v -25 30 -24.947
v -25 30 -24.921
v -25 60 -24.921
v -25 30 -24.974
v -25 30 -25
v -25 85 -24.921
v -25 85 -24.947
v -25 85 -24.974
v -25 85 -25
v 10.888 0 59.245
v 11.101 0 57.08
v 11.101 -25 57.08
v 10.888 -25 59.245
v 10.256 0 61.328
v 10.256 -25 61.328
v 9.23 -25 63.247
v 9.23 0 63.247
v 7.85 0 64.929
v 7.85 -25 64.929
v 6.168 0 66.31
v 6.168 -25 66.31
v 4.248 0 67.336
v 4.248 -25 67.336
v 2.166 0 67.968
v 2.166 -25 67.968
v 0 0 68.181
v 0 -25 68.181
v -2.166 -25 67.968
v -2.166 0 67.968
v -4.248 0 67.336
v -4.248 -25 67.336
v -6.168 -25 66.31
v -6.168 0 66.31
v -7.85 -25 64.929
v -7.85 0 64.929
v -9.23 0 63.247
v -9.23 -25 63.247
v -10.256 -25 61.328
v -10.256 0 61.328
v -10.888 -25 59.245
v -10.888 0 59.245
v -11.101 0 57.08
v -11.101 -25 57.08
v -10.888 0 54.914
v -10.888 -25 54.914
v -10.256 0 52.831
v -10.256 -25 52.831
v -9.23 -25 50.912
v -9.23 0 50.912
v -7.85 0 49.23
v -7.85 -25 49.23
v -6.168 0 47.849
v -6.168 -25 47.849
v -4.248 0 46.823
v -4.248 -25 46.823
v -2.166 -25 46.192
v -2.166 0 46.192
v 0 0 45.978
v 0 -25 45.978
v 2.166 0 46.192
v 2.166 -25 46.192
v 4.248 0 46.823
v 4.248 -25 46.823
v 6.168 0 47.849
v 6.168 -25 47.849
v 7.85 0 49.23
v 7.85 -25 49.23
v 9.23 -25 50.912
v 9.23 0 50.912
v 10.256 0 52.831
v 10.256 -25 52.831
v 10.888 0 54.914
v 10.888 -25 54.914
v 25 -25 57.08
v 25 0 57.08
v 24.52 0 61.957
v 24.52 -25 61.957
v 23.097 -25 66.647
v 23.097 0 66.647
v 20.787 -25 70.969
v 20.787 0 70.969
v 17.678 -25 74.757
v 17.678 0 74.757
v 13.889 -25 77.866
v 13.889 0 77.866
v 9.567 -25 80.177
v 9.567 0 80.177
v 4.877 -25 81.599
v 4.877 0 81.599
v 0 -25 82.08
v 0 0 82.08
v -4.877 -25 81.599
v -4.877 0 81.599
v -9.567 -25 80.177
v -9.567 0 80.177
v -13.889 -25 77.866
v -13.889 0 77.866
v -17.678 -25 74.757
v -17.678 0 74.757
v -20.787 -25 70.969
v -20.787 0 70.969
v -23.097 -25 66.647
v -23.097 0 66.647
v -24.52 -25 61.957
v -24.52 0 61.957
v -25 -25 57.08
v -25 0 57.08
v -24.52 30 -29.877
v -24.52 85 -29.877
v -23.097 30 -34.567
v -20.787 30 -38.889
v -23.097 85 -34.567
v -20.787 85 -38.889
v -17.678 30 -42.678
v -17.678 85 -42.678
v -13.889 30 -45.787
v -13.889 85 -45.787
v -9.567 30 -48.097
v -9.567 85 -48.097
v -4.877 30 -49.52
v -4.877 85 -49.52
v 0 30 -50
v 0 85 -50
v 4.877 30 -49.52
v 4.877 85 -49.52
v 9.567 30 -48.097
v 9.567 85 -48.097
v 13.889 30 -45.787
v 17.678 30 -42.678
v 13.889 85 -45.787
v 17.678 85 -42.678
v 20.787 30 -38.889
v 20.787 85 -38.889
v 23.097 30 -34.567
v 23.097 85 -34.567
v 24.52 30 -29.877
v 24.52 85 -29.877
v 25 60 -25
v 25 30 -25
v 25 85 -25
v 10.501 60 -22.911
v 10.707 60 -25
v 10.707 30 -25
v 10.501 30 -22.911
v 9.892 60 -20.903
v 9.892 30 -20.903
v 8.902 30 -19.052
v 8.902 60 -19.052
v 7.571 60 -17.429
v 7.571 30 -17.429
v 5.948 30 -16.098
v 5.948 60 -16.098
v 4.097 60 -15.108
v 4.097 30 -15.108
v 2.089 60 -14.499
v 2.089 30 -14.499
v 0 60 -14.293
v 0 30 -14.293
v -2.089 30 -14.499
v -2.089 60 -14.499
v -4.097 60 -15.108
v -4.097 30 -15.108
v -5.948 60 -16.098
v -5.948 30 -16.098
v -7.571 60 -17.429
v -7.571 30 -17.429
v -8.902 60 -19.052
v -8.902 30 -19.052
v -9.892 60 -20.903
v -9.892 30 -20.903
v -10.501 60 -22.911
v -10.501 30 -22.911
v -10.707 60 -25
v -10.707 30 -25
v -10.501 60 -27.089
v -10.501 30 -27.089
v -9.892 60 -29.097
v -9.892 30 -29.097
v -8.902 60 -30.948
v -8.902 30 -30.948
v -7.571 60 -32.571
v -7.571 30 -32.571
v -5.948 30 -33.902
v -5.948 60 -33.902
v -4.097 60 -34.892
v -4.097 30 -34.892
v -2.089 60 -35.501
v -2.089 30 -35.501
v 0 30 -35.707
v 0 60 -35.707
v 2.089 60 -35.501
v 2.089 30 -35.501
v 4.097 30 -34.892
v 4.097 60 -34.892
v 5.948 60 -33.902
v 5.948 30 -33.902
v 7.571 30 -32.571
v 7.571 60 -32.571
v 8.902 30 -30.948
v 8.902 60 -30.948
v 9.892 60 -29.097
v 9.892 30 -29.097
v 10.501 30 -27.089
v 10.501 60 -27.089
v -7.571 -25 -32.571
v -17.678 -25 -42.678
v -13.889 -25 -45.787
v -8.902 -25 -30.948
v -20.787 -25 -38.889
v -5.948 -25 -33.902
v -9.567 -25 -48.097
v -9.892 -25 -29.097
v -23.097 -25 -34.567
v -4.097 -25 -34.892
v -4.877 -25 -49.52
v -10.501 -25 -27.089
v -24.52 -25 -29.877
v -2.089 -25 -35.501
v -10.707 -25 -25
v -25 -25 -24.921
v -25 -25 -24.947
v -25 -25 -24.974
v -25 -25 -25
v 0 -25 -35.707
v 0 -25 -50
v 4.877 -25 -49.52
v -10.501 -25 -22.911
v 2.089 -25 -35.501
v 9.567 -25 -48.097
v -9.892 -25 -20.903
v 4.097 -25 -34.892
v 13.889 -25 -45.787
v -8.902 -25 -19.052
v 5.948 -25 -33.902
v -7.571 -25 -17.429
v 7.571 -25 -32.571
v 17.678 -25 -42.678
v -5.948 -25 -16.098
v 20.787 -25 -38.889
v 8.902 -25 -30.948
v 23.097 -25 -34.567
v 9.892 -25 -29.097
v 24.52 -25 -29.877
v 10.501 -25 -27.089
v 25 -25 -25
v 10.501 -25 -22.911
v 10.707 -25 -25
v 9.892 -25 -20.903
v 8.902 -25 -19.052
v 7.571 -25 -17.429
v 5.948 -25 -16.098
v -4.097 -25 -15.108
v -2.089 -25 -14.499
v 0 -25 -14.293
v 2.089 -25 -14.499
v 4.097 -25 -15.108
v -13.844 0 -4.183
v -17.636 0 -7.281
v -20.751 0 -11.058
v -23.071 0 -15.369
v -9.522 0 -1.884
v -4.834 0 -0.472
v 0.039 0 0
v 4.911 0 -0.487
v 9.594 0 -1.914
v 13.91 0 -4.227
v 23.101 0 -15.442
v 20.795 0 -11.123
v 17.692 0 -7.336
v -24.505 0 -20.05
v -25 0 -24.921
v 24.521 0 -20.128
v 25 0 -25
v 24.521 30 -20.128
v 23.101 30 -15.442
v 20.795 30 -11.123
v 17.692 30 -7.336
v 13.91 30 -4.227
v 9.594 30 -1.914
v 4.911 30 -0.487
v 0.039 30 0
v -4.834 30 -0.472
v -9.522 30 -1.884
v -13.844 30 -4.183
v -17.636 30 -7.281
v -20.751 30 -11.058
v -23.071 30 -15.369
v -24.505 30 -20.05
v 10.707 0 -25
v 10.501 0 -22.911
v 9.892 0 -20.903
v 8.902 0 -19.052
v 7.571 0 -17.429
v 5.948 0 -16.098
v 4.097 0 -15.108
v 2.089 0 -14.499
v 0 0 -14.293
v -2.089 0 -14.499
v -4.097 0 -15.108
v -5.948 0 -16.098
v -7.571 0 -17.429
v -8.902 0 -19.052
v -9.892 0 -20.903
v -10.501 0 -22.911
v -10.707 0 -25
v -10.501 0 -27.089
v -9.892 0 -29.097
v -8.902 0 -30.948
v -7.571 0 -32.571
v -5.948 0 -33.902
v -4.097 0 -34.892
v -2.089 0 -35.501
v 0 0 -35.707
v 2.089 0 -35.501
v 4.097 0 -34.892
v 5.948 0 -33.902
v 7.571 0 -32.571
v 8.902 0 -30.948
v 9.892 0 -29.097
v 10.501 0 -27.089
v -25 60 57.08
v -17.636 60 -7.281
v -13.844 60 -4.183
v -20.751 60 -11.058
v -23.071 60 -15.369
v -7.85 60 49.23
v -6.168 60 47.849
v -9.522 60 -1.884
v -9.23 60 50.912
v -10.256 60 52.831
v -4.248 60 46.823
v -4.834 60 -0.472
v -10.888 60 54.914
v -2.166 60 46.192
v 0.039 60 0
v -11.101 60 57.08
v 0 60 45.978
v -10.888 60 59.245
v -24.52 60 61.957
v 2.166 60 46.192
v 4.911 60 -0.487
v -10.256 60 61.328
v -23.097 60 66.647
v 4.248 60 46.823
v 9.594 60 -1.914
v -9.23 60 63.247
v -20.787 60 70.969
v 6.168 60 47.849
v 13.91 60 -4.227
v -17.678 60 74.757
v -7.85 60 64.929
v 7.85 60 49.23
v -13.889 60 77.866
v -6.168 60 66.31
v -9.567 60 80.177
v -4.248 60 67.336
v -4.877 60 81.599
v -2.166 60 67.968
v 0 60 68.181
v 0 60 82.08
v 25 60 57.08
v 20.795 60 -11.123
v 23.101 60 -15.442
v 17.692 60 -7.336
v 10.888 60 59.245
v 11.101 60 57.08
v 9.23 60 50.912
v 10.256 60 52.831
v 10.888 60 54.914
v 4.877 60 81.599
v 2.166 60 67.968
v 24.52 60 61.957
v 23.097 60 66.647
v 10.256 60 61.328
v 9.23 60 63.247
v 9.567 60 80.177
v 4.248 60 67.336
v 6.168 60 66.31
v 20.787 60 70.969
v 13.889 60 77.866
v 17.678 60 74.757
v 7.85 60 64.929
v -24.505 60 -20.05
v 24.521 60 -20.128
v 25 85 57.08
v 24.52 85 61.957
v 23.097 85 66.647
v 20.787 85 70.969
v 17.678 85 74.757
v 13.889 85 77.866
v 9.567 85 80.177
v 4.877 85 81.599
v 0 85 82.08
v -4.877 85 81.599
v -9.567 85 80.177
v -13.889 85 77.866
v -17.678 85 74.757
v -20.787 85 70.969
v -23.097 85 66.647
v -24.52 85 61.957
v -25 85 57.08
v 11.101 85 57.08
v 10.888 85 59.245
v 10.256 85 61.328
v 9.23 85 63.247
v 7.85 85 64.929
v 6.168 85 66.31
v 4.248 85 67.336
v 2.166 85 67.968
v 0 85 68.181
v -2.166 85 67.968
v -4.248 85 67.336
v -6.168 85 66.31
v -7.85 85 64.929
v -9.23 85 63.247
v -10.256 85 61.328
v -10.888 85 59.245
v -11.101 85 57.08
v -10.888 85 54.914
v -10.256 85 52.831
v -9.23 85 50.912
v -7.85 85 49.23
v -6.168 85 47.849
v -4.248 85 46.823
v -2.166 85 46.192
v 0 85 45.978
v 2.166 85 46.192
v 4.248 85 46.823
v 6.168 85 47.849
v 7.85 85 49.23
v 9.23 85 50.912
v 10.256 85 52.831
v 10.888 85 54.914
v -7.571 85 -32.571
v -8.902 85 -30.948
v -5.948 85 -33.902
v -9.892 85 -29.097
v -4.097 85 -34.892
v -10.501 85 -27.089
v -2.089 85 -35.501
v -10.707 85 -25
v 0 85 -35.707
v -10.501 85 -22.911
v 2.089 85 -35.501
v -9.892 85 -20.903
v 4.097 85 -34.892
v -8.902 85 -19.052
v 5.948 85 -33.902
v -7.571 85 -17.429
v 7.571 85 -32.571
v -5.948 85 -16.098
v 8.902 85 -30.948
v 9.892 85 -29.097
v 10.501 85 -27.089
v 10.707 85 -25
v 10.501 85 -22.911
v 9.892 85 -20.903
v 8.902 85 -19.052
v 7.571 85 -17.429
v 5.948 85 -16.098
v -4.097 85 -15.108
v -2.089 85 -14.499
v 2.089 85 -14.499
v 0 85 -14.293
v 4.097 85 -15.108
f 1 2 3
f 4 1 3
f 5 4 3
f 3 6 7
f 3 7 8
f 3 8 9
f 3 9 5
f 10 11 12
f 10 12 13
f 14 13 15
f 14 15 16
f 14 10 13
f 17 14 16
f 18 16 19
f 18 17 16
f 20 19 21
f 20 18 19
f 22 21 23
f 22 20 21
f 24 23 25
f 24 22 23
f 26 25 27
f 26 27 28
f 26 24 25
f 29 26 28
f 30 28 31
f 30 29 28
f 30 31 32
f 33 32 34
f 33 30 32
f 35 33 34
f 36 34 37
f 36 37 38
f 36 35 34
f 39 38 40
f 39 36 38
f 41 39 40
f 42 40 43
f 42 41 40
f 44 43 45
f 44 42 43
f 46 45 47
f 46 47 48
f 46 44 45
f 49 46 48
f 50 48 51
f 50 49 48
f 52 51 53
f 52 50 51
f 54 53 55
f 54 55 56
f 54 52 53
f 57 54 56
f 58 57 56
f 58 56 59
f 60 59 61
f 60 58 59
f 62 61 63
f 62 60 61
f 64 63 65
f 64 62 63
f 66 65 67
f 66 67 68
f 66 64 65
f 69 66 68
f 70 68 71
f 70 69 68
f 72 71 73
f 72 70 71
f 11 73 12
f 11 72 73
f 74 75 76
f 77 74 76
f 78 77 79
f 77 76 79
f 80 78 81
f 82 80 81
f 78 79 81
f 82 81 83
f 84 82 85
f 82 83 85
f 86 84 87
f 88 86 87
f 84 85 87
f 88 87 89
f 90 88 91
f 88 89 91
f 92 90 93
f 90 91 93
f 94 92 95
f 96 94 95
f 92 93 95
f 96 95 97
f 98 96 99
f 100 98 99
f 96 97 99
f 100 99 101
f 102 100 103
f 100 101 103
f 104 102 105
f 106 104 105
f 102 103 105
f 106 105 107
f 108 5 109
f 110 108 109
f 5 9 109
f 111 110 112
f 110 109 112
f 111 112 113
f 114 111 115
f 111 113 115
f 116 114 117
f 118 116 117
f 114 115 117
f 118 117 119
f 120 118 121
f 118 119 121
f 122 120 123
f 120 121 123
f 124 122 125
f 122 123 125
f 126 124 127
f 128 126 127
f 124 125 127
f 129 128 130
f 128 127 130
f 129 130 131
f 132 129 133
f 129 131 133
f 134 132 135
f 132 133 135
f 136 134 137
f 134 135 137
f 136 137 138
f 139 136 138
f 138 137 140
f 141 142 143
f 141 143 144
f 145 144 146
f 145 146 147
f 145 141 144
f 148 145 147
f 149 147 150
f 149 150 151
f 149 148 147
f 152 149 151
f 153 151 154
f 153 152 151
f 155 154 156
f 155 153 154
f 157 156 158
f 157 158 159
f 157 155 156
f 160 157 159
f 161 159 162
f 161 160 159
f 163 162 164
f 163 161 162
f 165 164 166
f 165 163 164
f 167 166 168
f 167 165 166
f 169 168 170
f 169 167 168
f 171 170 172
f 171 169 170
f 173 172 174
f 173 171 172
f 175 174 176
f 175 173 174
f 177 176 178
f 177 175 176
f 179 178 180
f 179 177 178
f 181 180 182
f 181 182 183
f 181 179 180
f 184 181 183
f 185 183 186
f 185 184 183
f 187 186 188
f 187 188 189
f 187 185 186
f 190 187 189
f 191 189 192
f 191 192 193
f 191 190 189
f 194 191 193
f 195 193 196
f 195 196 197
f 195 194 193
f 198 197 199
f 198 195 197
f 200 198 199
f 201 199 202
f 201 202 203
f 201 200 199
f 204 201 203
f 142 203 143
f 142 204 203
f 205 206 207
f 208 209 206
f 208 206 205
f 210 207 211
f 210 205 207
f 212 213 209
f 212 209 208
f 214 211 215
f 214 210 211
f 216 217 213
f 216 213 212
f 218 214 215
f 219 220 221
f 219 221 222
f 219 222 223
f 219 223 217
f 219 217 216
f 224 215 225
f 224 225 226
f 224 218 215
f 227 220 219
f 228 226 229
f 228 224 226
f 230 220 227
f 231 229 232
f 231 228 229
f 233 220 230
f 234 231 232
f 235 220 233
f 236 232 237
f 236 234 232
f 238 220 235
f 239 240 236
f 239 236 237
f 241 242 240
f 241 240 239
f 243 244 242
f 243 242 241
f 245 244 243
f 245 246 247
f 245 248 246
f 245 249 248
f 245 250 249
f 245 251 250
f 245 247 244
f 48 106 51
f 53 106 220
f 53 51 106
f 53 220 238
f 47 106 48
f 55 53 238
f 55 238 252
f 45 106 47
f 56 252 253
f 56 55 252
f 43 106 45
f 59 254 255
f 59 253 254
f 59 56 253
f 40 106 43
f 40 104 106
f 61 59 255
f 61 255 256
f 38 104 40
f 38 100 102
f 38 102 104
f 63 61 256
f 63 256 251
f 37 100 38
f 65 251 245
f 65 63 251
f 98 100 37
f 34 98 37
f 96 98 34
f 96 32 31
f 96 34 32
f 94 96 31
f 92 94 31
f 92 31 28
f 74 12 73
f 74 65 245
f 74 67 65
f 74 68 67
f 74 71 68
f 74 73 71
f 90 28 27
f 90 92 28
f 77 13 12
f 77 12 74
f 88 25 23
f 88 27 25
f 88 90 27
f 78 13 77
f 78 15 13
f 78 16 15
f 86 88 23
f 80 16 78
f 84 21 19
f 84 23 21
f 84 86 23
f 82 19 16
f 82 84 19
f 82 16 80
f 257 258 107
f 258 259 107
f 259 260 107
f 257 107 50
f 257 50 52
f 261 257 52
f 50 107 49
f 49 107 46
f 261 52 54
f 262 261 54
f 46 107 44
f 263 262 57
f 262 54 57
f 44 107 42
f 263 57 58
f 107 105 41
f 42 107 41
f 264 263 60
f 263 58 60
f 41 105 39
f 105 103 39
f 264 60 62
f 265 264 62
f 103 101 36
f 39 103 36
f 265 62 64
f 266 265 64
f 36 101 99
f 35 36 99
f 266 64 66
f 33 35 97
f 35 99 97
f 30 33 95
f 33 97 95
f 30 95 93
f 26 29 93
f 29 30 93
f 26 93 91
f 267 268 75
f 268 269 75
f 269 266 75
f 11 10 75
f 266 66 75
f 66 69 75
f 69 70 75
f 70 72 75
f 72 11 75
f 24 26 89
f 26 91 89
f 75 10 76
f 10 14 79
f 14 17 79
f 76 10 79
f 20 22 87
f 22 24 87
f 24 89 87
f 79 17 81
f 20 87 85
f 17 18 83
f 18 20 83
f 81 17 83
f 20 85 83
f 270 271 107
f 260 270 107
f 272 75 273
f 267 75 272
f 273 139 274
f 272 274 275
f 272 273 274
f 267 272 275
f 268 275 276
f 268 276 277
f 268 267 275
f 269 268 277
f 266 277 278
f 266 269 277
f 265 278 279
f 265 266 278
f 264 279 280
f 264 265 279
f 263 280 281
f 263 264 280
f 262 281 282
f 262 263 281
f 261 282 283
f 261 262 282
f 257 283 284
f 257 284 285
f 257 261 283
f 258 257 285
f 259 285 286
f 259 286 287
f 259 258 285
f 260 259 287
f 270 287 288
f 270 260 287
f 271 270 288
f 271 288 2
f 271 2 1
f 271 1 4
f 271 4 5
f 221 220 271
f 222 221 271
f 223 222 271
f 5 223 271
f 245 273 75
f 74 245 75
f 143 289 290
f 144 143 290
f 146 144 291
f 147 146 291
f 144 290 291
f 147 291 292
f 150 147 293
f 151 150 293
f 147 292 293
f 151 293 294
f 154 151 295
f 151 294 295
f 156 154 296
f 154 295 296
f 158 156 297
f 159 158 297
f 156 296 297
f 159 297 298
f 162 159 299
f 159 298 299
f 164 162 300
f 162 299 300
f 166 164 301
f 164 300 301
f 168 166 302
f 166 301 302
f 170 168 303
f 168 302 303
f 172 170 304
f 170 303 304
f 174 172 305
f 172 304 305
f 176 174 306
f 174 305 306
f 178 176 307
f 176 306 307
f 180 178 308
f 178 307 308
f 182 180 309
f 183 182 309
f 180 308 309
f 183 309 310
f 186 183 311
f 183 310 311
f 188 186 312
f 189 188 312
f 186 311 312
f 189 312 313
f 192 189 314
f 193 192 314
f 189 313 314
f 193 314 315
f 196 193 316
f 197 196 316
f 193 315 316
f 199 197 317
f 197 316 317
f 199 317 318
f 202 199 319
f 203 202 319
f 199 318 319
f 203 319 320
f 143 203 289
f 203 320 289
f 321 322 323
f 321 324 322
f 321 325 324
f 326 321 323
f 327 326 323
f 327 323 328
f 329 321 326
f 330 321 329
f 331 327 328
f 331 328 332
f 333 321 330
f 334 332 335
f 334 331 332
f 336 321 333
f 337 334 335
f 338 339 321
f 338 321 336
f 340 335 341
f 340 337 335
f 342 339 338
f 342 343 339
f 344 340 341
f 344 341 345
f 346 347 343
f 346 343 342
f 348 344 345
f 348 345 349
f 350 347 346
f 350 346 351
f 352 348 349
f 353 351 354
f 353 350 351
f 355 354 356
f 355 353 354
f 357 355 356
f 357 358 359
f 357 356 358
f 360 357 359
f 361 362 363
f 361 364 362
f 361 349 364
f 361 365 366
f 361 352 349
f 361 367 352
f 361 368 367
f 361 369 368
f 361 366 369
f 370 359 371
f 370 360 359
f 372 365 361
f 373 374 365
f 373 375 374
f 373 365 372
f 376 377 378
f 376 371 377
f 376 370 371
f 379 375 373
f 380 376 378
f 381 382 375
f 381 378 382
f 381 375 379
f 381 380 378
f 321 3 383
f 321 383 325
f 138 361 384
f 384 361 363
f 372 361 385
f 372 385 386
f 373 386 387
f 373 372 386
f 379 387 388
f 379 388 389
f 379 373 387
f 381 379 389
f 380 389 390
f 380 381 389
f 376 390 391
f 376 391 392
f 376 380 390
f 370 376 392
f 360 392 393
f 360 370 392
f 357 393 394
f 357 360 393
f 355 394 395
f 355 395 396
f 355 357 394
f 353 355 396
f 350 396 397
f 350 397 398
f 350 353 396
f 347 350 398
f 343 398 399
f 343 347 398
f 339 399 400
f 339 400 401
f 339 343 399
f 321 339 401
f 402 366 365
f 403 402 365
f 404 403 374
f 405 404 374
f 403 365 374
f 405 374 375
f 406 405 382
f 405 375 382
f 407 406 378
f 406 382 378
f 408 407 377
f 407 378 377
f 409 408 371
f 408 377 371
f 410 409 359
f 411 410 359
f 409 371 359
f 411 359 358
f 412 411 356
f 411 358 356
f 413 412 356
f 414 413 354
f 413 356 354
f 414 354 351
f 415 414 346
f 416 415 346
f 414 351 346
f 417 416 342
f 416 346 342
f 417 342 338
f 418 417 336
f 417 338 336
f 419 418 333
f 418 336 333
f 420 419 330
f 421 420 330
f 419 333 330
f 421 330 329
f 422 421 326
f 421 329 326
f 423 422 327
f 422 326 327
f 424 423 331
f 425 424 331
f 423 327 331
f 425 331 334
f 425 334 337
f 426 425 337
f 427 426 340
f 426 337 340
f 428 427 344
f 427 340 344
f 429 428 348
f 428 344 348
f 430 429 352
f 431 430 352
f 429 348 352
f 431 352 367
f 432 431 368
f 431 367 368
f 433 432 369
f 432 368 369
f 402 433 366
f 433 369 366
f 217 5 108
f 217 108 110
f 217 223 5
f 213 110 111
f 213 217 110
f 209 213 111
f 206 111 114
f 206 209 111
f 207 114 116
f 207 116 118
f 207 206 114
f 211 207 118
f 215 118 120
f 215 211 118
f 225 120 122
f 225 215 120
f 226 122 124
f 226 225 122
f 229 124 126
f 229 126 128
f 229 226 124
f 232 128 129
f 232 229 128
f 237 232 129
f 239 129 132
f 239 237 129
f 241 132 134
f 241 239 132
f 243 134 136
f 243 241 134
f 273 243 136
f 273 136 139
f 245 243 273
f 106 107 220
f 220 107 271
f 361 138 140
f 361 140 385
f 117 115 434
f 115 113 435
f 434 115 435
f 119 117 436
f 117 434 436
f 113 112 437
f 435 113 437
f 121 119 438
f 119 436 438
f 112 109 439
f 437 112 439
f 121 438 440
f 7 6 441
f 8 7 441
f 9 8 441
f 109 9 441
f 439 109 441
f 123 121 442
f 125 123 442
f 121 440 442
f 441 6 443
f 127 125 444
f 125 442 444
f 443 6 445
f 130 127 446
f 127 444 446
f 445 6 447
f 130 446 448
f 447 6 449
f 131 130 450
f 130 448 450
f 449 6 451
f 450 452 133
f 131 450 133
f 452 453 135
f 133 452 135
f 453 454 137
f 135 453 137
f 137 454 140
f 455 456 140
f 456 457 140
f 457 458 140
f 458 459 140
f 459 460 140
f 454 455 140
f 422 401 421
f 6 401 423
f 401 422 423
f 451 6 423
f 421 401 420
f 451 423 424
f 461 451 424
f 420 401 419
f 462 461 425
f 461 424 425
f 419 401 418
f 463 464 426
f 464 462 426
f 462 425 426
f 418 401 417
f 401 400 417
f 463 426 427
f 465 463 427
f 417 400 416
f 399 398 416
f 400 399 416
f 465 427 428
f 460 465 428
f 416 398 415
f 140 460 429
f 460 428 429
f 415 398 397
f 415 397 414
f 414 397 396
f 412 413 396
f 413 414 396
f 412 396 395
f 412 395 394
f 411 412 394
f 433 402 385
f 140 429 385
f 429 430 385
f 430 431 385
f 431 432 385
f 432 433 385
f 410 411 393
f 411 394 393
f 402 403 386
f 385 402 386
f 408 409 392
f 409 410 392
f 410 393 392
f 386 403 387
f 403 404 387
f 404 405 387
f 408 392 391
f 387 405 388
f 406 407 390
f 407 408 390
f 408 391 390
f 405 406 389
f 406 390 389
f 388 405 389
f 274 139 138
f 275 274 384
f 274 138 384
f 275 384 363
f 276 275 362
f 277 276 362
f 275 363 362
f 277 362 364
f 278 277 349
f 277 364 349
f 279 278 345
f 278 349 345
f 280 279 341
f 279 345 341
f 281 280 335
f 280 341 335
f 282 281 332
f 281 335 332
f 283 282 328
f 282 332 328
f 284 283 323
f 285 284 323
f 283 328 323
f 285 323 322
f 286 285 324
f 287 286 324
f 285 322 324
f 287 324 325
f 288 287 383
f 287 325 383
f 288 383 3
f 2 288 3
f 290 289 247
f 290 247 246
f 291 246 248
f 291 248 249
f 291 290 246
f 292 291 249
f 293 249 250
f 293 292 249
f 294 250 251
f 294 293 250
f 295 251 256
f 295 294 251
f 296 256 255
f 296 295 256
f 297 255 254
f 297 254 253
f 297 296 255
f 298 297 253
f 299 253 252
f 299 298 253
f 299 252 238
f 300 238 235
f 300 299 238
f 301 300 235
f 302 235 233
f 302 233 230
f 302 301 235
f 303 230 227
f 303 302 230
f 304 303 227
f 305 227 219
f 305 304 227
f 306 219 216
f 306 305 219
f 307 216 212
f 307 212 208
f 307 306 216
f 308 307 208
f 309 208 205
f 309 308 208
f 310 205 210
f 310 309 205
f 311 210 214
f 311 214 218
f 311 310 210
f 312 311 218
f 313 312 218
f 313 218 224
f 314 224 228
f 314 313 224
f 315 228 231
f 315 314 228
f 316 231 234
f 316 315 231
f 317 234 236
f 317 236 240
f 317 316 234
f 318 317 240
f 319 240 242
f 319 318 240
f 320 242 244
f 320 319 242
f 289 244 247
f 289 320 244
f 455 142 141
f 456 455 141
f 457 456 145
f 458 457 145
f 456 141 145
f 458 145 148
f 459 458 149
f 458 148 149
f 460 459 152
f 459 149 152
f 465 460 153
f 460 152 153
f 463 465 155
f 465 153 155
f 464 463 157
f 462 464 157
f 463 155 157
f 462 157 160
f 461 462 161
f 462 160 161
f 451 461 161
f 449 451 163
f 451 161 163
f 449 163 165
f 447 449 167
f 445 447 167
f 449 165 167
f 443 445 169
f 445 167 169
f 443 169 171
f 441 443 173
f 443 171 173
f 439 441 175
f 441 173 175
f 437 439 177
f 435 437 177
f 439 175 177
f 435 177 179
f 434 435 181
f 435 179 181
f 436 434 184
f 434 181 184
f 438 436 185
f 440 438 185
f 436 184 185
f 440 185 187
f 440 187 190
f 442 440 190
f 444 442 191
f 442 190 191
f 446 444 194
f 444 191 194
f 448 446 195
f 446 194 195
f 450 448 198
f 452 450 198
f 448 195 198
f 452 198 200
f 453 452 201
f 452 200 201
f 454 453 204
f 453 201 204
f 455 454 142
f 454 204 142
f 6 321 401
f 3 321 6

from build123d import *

# Parameters (mm, degrees)
F0_R     = 11.101292
F0_R_2   = 10.706517
F1_DEPTH = 25
F2_DEPTH = 30


with BuildPart() as f1:
    # F0 (on Front) → F1 (new body)
    with BuildSketch(Plane.XZ):
        with BuildLine():
            Line((-25, 57.079587), (-24.999876, -24.921242))
            ThreePointArc((-24.999876, -24.921242), (0.039379, -3.1e-05), (25, -25))
            Line((25, -25), (25, 57.079587))
            ThreePointArc((25, 57.079587), (0, 82.079587), (-25, 57.079587))
        make_face()
        with Locations((0, 57.079587)):
            Circle(F0_R, mode=Mode.SUBTRACT)
        with BuildLine():
            ThreePointArc((25, -25), (0.039379, -3.1e-05), (-24.999876, -24.921242))
            ThreePointArc((-24.999876, -24.921242), (-24.999969, -24.960621), (-25, -25))
            ThreePointArc((-25, -25), (0, -50), (25, -25))
        make_face()
        with Locations((0, -25)):
            Circle(F0_R_2, mode=Mode.SUBTRACT)
    extrude(amount=F1_DEPTH)

    # F0 (on Front) → F2 (join)
    with BuildSketch(Plane.XZ):
        with BuildLine():
            ThreePointArc((25, -25), (0.039379, -3.1e-05), (-24.999876, -24.921242))
            ThreePointArc((-24.999876, -24.921242), (-24.999969, -24.960621), (-25, -25))
            ThreePointArc((-25, -25), (0, -50), (25, -25))
        make_face()
        with Locations((0, -25)):
            Circle(F0_R_2, mode=Mode.SUBTRACT)
    extrude(amount=-F2_DEPTH)

    # F3: F1 across face


with BuildPart() as f1_1:
    add(f1.part)
    add(f1.part.mirror(Plane(origin=(0, 30, -25), x_dir=(1, 0, 0), z_dir=(0, 1, 0))))


solid = f1_1.part
